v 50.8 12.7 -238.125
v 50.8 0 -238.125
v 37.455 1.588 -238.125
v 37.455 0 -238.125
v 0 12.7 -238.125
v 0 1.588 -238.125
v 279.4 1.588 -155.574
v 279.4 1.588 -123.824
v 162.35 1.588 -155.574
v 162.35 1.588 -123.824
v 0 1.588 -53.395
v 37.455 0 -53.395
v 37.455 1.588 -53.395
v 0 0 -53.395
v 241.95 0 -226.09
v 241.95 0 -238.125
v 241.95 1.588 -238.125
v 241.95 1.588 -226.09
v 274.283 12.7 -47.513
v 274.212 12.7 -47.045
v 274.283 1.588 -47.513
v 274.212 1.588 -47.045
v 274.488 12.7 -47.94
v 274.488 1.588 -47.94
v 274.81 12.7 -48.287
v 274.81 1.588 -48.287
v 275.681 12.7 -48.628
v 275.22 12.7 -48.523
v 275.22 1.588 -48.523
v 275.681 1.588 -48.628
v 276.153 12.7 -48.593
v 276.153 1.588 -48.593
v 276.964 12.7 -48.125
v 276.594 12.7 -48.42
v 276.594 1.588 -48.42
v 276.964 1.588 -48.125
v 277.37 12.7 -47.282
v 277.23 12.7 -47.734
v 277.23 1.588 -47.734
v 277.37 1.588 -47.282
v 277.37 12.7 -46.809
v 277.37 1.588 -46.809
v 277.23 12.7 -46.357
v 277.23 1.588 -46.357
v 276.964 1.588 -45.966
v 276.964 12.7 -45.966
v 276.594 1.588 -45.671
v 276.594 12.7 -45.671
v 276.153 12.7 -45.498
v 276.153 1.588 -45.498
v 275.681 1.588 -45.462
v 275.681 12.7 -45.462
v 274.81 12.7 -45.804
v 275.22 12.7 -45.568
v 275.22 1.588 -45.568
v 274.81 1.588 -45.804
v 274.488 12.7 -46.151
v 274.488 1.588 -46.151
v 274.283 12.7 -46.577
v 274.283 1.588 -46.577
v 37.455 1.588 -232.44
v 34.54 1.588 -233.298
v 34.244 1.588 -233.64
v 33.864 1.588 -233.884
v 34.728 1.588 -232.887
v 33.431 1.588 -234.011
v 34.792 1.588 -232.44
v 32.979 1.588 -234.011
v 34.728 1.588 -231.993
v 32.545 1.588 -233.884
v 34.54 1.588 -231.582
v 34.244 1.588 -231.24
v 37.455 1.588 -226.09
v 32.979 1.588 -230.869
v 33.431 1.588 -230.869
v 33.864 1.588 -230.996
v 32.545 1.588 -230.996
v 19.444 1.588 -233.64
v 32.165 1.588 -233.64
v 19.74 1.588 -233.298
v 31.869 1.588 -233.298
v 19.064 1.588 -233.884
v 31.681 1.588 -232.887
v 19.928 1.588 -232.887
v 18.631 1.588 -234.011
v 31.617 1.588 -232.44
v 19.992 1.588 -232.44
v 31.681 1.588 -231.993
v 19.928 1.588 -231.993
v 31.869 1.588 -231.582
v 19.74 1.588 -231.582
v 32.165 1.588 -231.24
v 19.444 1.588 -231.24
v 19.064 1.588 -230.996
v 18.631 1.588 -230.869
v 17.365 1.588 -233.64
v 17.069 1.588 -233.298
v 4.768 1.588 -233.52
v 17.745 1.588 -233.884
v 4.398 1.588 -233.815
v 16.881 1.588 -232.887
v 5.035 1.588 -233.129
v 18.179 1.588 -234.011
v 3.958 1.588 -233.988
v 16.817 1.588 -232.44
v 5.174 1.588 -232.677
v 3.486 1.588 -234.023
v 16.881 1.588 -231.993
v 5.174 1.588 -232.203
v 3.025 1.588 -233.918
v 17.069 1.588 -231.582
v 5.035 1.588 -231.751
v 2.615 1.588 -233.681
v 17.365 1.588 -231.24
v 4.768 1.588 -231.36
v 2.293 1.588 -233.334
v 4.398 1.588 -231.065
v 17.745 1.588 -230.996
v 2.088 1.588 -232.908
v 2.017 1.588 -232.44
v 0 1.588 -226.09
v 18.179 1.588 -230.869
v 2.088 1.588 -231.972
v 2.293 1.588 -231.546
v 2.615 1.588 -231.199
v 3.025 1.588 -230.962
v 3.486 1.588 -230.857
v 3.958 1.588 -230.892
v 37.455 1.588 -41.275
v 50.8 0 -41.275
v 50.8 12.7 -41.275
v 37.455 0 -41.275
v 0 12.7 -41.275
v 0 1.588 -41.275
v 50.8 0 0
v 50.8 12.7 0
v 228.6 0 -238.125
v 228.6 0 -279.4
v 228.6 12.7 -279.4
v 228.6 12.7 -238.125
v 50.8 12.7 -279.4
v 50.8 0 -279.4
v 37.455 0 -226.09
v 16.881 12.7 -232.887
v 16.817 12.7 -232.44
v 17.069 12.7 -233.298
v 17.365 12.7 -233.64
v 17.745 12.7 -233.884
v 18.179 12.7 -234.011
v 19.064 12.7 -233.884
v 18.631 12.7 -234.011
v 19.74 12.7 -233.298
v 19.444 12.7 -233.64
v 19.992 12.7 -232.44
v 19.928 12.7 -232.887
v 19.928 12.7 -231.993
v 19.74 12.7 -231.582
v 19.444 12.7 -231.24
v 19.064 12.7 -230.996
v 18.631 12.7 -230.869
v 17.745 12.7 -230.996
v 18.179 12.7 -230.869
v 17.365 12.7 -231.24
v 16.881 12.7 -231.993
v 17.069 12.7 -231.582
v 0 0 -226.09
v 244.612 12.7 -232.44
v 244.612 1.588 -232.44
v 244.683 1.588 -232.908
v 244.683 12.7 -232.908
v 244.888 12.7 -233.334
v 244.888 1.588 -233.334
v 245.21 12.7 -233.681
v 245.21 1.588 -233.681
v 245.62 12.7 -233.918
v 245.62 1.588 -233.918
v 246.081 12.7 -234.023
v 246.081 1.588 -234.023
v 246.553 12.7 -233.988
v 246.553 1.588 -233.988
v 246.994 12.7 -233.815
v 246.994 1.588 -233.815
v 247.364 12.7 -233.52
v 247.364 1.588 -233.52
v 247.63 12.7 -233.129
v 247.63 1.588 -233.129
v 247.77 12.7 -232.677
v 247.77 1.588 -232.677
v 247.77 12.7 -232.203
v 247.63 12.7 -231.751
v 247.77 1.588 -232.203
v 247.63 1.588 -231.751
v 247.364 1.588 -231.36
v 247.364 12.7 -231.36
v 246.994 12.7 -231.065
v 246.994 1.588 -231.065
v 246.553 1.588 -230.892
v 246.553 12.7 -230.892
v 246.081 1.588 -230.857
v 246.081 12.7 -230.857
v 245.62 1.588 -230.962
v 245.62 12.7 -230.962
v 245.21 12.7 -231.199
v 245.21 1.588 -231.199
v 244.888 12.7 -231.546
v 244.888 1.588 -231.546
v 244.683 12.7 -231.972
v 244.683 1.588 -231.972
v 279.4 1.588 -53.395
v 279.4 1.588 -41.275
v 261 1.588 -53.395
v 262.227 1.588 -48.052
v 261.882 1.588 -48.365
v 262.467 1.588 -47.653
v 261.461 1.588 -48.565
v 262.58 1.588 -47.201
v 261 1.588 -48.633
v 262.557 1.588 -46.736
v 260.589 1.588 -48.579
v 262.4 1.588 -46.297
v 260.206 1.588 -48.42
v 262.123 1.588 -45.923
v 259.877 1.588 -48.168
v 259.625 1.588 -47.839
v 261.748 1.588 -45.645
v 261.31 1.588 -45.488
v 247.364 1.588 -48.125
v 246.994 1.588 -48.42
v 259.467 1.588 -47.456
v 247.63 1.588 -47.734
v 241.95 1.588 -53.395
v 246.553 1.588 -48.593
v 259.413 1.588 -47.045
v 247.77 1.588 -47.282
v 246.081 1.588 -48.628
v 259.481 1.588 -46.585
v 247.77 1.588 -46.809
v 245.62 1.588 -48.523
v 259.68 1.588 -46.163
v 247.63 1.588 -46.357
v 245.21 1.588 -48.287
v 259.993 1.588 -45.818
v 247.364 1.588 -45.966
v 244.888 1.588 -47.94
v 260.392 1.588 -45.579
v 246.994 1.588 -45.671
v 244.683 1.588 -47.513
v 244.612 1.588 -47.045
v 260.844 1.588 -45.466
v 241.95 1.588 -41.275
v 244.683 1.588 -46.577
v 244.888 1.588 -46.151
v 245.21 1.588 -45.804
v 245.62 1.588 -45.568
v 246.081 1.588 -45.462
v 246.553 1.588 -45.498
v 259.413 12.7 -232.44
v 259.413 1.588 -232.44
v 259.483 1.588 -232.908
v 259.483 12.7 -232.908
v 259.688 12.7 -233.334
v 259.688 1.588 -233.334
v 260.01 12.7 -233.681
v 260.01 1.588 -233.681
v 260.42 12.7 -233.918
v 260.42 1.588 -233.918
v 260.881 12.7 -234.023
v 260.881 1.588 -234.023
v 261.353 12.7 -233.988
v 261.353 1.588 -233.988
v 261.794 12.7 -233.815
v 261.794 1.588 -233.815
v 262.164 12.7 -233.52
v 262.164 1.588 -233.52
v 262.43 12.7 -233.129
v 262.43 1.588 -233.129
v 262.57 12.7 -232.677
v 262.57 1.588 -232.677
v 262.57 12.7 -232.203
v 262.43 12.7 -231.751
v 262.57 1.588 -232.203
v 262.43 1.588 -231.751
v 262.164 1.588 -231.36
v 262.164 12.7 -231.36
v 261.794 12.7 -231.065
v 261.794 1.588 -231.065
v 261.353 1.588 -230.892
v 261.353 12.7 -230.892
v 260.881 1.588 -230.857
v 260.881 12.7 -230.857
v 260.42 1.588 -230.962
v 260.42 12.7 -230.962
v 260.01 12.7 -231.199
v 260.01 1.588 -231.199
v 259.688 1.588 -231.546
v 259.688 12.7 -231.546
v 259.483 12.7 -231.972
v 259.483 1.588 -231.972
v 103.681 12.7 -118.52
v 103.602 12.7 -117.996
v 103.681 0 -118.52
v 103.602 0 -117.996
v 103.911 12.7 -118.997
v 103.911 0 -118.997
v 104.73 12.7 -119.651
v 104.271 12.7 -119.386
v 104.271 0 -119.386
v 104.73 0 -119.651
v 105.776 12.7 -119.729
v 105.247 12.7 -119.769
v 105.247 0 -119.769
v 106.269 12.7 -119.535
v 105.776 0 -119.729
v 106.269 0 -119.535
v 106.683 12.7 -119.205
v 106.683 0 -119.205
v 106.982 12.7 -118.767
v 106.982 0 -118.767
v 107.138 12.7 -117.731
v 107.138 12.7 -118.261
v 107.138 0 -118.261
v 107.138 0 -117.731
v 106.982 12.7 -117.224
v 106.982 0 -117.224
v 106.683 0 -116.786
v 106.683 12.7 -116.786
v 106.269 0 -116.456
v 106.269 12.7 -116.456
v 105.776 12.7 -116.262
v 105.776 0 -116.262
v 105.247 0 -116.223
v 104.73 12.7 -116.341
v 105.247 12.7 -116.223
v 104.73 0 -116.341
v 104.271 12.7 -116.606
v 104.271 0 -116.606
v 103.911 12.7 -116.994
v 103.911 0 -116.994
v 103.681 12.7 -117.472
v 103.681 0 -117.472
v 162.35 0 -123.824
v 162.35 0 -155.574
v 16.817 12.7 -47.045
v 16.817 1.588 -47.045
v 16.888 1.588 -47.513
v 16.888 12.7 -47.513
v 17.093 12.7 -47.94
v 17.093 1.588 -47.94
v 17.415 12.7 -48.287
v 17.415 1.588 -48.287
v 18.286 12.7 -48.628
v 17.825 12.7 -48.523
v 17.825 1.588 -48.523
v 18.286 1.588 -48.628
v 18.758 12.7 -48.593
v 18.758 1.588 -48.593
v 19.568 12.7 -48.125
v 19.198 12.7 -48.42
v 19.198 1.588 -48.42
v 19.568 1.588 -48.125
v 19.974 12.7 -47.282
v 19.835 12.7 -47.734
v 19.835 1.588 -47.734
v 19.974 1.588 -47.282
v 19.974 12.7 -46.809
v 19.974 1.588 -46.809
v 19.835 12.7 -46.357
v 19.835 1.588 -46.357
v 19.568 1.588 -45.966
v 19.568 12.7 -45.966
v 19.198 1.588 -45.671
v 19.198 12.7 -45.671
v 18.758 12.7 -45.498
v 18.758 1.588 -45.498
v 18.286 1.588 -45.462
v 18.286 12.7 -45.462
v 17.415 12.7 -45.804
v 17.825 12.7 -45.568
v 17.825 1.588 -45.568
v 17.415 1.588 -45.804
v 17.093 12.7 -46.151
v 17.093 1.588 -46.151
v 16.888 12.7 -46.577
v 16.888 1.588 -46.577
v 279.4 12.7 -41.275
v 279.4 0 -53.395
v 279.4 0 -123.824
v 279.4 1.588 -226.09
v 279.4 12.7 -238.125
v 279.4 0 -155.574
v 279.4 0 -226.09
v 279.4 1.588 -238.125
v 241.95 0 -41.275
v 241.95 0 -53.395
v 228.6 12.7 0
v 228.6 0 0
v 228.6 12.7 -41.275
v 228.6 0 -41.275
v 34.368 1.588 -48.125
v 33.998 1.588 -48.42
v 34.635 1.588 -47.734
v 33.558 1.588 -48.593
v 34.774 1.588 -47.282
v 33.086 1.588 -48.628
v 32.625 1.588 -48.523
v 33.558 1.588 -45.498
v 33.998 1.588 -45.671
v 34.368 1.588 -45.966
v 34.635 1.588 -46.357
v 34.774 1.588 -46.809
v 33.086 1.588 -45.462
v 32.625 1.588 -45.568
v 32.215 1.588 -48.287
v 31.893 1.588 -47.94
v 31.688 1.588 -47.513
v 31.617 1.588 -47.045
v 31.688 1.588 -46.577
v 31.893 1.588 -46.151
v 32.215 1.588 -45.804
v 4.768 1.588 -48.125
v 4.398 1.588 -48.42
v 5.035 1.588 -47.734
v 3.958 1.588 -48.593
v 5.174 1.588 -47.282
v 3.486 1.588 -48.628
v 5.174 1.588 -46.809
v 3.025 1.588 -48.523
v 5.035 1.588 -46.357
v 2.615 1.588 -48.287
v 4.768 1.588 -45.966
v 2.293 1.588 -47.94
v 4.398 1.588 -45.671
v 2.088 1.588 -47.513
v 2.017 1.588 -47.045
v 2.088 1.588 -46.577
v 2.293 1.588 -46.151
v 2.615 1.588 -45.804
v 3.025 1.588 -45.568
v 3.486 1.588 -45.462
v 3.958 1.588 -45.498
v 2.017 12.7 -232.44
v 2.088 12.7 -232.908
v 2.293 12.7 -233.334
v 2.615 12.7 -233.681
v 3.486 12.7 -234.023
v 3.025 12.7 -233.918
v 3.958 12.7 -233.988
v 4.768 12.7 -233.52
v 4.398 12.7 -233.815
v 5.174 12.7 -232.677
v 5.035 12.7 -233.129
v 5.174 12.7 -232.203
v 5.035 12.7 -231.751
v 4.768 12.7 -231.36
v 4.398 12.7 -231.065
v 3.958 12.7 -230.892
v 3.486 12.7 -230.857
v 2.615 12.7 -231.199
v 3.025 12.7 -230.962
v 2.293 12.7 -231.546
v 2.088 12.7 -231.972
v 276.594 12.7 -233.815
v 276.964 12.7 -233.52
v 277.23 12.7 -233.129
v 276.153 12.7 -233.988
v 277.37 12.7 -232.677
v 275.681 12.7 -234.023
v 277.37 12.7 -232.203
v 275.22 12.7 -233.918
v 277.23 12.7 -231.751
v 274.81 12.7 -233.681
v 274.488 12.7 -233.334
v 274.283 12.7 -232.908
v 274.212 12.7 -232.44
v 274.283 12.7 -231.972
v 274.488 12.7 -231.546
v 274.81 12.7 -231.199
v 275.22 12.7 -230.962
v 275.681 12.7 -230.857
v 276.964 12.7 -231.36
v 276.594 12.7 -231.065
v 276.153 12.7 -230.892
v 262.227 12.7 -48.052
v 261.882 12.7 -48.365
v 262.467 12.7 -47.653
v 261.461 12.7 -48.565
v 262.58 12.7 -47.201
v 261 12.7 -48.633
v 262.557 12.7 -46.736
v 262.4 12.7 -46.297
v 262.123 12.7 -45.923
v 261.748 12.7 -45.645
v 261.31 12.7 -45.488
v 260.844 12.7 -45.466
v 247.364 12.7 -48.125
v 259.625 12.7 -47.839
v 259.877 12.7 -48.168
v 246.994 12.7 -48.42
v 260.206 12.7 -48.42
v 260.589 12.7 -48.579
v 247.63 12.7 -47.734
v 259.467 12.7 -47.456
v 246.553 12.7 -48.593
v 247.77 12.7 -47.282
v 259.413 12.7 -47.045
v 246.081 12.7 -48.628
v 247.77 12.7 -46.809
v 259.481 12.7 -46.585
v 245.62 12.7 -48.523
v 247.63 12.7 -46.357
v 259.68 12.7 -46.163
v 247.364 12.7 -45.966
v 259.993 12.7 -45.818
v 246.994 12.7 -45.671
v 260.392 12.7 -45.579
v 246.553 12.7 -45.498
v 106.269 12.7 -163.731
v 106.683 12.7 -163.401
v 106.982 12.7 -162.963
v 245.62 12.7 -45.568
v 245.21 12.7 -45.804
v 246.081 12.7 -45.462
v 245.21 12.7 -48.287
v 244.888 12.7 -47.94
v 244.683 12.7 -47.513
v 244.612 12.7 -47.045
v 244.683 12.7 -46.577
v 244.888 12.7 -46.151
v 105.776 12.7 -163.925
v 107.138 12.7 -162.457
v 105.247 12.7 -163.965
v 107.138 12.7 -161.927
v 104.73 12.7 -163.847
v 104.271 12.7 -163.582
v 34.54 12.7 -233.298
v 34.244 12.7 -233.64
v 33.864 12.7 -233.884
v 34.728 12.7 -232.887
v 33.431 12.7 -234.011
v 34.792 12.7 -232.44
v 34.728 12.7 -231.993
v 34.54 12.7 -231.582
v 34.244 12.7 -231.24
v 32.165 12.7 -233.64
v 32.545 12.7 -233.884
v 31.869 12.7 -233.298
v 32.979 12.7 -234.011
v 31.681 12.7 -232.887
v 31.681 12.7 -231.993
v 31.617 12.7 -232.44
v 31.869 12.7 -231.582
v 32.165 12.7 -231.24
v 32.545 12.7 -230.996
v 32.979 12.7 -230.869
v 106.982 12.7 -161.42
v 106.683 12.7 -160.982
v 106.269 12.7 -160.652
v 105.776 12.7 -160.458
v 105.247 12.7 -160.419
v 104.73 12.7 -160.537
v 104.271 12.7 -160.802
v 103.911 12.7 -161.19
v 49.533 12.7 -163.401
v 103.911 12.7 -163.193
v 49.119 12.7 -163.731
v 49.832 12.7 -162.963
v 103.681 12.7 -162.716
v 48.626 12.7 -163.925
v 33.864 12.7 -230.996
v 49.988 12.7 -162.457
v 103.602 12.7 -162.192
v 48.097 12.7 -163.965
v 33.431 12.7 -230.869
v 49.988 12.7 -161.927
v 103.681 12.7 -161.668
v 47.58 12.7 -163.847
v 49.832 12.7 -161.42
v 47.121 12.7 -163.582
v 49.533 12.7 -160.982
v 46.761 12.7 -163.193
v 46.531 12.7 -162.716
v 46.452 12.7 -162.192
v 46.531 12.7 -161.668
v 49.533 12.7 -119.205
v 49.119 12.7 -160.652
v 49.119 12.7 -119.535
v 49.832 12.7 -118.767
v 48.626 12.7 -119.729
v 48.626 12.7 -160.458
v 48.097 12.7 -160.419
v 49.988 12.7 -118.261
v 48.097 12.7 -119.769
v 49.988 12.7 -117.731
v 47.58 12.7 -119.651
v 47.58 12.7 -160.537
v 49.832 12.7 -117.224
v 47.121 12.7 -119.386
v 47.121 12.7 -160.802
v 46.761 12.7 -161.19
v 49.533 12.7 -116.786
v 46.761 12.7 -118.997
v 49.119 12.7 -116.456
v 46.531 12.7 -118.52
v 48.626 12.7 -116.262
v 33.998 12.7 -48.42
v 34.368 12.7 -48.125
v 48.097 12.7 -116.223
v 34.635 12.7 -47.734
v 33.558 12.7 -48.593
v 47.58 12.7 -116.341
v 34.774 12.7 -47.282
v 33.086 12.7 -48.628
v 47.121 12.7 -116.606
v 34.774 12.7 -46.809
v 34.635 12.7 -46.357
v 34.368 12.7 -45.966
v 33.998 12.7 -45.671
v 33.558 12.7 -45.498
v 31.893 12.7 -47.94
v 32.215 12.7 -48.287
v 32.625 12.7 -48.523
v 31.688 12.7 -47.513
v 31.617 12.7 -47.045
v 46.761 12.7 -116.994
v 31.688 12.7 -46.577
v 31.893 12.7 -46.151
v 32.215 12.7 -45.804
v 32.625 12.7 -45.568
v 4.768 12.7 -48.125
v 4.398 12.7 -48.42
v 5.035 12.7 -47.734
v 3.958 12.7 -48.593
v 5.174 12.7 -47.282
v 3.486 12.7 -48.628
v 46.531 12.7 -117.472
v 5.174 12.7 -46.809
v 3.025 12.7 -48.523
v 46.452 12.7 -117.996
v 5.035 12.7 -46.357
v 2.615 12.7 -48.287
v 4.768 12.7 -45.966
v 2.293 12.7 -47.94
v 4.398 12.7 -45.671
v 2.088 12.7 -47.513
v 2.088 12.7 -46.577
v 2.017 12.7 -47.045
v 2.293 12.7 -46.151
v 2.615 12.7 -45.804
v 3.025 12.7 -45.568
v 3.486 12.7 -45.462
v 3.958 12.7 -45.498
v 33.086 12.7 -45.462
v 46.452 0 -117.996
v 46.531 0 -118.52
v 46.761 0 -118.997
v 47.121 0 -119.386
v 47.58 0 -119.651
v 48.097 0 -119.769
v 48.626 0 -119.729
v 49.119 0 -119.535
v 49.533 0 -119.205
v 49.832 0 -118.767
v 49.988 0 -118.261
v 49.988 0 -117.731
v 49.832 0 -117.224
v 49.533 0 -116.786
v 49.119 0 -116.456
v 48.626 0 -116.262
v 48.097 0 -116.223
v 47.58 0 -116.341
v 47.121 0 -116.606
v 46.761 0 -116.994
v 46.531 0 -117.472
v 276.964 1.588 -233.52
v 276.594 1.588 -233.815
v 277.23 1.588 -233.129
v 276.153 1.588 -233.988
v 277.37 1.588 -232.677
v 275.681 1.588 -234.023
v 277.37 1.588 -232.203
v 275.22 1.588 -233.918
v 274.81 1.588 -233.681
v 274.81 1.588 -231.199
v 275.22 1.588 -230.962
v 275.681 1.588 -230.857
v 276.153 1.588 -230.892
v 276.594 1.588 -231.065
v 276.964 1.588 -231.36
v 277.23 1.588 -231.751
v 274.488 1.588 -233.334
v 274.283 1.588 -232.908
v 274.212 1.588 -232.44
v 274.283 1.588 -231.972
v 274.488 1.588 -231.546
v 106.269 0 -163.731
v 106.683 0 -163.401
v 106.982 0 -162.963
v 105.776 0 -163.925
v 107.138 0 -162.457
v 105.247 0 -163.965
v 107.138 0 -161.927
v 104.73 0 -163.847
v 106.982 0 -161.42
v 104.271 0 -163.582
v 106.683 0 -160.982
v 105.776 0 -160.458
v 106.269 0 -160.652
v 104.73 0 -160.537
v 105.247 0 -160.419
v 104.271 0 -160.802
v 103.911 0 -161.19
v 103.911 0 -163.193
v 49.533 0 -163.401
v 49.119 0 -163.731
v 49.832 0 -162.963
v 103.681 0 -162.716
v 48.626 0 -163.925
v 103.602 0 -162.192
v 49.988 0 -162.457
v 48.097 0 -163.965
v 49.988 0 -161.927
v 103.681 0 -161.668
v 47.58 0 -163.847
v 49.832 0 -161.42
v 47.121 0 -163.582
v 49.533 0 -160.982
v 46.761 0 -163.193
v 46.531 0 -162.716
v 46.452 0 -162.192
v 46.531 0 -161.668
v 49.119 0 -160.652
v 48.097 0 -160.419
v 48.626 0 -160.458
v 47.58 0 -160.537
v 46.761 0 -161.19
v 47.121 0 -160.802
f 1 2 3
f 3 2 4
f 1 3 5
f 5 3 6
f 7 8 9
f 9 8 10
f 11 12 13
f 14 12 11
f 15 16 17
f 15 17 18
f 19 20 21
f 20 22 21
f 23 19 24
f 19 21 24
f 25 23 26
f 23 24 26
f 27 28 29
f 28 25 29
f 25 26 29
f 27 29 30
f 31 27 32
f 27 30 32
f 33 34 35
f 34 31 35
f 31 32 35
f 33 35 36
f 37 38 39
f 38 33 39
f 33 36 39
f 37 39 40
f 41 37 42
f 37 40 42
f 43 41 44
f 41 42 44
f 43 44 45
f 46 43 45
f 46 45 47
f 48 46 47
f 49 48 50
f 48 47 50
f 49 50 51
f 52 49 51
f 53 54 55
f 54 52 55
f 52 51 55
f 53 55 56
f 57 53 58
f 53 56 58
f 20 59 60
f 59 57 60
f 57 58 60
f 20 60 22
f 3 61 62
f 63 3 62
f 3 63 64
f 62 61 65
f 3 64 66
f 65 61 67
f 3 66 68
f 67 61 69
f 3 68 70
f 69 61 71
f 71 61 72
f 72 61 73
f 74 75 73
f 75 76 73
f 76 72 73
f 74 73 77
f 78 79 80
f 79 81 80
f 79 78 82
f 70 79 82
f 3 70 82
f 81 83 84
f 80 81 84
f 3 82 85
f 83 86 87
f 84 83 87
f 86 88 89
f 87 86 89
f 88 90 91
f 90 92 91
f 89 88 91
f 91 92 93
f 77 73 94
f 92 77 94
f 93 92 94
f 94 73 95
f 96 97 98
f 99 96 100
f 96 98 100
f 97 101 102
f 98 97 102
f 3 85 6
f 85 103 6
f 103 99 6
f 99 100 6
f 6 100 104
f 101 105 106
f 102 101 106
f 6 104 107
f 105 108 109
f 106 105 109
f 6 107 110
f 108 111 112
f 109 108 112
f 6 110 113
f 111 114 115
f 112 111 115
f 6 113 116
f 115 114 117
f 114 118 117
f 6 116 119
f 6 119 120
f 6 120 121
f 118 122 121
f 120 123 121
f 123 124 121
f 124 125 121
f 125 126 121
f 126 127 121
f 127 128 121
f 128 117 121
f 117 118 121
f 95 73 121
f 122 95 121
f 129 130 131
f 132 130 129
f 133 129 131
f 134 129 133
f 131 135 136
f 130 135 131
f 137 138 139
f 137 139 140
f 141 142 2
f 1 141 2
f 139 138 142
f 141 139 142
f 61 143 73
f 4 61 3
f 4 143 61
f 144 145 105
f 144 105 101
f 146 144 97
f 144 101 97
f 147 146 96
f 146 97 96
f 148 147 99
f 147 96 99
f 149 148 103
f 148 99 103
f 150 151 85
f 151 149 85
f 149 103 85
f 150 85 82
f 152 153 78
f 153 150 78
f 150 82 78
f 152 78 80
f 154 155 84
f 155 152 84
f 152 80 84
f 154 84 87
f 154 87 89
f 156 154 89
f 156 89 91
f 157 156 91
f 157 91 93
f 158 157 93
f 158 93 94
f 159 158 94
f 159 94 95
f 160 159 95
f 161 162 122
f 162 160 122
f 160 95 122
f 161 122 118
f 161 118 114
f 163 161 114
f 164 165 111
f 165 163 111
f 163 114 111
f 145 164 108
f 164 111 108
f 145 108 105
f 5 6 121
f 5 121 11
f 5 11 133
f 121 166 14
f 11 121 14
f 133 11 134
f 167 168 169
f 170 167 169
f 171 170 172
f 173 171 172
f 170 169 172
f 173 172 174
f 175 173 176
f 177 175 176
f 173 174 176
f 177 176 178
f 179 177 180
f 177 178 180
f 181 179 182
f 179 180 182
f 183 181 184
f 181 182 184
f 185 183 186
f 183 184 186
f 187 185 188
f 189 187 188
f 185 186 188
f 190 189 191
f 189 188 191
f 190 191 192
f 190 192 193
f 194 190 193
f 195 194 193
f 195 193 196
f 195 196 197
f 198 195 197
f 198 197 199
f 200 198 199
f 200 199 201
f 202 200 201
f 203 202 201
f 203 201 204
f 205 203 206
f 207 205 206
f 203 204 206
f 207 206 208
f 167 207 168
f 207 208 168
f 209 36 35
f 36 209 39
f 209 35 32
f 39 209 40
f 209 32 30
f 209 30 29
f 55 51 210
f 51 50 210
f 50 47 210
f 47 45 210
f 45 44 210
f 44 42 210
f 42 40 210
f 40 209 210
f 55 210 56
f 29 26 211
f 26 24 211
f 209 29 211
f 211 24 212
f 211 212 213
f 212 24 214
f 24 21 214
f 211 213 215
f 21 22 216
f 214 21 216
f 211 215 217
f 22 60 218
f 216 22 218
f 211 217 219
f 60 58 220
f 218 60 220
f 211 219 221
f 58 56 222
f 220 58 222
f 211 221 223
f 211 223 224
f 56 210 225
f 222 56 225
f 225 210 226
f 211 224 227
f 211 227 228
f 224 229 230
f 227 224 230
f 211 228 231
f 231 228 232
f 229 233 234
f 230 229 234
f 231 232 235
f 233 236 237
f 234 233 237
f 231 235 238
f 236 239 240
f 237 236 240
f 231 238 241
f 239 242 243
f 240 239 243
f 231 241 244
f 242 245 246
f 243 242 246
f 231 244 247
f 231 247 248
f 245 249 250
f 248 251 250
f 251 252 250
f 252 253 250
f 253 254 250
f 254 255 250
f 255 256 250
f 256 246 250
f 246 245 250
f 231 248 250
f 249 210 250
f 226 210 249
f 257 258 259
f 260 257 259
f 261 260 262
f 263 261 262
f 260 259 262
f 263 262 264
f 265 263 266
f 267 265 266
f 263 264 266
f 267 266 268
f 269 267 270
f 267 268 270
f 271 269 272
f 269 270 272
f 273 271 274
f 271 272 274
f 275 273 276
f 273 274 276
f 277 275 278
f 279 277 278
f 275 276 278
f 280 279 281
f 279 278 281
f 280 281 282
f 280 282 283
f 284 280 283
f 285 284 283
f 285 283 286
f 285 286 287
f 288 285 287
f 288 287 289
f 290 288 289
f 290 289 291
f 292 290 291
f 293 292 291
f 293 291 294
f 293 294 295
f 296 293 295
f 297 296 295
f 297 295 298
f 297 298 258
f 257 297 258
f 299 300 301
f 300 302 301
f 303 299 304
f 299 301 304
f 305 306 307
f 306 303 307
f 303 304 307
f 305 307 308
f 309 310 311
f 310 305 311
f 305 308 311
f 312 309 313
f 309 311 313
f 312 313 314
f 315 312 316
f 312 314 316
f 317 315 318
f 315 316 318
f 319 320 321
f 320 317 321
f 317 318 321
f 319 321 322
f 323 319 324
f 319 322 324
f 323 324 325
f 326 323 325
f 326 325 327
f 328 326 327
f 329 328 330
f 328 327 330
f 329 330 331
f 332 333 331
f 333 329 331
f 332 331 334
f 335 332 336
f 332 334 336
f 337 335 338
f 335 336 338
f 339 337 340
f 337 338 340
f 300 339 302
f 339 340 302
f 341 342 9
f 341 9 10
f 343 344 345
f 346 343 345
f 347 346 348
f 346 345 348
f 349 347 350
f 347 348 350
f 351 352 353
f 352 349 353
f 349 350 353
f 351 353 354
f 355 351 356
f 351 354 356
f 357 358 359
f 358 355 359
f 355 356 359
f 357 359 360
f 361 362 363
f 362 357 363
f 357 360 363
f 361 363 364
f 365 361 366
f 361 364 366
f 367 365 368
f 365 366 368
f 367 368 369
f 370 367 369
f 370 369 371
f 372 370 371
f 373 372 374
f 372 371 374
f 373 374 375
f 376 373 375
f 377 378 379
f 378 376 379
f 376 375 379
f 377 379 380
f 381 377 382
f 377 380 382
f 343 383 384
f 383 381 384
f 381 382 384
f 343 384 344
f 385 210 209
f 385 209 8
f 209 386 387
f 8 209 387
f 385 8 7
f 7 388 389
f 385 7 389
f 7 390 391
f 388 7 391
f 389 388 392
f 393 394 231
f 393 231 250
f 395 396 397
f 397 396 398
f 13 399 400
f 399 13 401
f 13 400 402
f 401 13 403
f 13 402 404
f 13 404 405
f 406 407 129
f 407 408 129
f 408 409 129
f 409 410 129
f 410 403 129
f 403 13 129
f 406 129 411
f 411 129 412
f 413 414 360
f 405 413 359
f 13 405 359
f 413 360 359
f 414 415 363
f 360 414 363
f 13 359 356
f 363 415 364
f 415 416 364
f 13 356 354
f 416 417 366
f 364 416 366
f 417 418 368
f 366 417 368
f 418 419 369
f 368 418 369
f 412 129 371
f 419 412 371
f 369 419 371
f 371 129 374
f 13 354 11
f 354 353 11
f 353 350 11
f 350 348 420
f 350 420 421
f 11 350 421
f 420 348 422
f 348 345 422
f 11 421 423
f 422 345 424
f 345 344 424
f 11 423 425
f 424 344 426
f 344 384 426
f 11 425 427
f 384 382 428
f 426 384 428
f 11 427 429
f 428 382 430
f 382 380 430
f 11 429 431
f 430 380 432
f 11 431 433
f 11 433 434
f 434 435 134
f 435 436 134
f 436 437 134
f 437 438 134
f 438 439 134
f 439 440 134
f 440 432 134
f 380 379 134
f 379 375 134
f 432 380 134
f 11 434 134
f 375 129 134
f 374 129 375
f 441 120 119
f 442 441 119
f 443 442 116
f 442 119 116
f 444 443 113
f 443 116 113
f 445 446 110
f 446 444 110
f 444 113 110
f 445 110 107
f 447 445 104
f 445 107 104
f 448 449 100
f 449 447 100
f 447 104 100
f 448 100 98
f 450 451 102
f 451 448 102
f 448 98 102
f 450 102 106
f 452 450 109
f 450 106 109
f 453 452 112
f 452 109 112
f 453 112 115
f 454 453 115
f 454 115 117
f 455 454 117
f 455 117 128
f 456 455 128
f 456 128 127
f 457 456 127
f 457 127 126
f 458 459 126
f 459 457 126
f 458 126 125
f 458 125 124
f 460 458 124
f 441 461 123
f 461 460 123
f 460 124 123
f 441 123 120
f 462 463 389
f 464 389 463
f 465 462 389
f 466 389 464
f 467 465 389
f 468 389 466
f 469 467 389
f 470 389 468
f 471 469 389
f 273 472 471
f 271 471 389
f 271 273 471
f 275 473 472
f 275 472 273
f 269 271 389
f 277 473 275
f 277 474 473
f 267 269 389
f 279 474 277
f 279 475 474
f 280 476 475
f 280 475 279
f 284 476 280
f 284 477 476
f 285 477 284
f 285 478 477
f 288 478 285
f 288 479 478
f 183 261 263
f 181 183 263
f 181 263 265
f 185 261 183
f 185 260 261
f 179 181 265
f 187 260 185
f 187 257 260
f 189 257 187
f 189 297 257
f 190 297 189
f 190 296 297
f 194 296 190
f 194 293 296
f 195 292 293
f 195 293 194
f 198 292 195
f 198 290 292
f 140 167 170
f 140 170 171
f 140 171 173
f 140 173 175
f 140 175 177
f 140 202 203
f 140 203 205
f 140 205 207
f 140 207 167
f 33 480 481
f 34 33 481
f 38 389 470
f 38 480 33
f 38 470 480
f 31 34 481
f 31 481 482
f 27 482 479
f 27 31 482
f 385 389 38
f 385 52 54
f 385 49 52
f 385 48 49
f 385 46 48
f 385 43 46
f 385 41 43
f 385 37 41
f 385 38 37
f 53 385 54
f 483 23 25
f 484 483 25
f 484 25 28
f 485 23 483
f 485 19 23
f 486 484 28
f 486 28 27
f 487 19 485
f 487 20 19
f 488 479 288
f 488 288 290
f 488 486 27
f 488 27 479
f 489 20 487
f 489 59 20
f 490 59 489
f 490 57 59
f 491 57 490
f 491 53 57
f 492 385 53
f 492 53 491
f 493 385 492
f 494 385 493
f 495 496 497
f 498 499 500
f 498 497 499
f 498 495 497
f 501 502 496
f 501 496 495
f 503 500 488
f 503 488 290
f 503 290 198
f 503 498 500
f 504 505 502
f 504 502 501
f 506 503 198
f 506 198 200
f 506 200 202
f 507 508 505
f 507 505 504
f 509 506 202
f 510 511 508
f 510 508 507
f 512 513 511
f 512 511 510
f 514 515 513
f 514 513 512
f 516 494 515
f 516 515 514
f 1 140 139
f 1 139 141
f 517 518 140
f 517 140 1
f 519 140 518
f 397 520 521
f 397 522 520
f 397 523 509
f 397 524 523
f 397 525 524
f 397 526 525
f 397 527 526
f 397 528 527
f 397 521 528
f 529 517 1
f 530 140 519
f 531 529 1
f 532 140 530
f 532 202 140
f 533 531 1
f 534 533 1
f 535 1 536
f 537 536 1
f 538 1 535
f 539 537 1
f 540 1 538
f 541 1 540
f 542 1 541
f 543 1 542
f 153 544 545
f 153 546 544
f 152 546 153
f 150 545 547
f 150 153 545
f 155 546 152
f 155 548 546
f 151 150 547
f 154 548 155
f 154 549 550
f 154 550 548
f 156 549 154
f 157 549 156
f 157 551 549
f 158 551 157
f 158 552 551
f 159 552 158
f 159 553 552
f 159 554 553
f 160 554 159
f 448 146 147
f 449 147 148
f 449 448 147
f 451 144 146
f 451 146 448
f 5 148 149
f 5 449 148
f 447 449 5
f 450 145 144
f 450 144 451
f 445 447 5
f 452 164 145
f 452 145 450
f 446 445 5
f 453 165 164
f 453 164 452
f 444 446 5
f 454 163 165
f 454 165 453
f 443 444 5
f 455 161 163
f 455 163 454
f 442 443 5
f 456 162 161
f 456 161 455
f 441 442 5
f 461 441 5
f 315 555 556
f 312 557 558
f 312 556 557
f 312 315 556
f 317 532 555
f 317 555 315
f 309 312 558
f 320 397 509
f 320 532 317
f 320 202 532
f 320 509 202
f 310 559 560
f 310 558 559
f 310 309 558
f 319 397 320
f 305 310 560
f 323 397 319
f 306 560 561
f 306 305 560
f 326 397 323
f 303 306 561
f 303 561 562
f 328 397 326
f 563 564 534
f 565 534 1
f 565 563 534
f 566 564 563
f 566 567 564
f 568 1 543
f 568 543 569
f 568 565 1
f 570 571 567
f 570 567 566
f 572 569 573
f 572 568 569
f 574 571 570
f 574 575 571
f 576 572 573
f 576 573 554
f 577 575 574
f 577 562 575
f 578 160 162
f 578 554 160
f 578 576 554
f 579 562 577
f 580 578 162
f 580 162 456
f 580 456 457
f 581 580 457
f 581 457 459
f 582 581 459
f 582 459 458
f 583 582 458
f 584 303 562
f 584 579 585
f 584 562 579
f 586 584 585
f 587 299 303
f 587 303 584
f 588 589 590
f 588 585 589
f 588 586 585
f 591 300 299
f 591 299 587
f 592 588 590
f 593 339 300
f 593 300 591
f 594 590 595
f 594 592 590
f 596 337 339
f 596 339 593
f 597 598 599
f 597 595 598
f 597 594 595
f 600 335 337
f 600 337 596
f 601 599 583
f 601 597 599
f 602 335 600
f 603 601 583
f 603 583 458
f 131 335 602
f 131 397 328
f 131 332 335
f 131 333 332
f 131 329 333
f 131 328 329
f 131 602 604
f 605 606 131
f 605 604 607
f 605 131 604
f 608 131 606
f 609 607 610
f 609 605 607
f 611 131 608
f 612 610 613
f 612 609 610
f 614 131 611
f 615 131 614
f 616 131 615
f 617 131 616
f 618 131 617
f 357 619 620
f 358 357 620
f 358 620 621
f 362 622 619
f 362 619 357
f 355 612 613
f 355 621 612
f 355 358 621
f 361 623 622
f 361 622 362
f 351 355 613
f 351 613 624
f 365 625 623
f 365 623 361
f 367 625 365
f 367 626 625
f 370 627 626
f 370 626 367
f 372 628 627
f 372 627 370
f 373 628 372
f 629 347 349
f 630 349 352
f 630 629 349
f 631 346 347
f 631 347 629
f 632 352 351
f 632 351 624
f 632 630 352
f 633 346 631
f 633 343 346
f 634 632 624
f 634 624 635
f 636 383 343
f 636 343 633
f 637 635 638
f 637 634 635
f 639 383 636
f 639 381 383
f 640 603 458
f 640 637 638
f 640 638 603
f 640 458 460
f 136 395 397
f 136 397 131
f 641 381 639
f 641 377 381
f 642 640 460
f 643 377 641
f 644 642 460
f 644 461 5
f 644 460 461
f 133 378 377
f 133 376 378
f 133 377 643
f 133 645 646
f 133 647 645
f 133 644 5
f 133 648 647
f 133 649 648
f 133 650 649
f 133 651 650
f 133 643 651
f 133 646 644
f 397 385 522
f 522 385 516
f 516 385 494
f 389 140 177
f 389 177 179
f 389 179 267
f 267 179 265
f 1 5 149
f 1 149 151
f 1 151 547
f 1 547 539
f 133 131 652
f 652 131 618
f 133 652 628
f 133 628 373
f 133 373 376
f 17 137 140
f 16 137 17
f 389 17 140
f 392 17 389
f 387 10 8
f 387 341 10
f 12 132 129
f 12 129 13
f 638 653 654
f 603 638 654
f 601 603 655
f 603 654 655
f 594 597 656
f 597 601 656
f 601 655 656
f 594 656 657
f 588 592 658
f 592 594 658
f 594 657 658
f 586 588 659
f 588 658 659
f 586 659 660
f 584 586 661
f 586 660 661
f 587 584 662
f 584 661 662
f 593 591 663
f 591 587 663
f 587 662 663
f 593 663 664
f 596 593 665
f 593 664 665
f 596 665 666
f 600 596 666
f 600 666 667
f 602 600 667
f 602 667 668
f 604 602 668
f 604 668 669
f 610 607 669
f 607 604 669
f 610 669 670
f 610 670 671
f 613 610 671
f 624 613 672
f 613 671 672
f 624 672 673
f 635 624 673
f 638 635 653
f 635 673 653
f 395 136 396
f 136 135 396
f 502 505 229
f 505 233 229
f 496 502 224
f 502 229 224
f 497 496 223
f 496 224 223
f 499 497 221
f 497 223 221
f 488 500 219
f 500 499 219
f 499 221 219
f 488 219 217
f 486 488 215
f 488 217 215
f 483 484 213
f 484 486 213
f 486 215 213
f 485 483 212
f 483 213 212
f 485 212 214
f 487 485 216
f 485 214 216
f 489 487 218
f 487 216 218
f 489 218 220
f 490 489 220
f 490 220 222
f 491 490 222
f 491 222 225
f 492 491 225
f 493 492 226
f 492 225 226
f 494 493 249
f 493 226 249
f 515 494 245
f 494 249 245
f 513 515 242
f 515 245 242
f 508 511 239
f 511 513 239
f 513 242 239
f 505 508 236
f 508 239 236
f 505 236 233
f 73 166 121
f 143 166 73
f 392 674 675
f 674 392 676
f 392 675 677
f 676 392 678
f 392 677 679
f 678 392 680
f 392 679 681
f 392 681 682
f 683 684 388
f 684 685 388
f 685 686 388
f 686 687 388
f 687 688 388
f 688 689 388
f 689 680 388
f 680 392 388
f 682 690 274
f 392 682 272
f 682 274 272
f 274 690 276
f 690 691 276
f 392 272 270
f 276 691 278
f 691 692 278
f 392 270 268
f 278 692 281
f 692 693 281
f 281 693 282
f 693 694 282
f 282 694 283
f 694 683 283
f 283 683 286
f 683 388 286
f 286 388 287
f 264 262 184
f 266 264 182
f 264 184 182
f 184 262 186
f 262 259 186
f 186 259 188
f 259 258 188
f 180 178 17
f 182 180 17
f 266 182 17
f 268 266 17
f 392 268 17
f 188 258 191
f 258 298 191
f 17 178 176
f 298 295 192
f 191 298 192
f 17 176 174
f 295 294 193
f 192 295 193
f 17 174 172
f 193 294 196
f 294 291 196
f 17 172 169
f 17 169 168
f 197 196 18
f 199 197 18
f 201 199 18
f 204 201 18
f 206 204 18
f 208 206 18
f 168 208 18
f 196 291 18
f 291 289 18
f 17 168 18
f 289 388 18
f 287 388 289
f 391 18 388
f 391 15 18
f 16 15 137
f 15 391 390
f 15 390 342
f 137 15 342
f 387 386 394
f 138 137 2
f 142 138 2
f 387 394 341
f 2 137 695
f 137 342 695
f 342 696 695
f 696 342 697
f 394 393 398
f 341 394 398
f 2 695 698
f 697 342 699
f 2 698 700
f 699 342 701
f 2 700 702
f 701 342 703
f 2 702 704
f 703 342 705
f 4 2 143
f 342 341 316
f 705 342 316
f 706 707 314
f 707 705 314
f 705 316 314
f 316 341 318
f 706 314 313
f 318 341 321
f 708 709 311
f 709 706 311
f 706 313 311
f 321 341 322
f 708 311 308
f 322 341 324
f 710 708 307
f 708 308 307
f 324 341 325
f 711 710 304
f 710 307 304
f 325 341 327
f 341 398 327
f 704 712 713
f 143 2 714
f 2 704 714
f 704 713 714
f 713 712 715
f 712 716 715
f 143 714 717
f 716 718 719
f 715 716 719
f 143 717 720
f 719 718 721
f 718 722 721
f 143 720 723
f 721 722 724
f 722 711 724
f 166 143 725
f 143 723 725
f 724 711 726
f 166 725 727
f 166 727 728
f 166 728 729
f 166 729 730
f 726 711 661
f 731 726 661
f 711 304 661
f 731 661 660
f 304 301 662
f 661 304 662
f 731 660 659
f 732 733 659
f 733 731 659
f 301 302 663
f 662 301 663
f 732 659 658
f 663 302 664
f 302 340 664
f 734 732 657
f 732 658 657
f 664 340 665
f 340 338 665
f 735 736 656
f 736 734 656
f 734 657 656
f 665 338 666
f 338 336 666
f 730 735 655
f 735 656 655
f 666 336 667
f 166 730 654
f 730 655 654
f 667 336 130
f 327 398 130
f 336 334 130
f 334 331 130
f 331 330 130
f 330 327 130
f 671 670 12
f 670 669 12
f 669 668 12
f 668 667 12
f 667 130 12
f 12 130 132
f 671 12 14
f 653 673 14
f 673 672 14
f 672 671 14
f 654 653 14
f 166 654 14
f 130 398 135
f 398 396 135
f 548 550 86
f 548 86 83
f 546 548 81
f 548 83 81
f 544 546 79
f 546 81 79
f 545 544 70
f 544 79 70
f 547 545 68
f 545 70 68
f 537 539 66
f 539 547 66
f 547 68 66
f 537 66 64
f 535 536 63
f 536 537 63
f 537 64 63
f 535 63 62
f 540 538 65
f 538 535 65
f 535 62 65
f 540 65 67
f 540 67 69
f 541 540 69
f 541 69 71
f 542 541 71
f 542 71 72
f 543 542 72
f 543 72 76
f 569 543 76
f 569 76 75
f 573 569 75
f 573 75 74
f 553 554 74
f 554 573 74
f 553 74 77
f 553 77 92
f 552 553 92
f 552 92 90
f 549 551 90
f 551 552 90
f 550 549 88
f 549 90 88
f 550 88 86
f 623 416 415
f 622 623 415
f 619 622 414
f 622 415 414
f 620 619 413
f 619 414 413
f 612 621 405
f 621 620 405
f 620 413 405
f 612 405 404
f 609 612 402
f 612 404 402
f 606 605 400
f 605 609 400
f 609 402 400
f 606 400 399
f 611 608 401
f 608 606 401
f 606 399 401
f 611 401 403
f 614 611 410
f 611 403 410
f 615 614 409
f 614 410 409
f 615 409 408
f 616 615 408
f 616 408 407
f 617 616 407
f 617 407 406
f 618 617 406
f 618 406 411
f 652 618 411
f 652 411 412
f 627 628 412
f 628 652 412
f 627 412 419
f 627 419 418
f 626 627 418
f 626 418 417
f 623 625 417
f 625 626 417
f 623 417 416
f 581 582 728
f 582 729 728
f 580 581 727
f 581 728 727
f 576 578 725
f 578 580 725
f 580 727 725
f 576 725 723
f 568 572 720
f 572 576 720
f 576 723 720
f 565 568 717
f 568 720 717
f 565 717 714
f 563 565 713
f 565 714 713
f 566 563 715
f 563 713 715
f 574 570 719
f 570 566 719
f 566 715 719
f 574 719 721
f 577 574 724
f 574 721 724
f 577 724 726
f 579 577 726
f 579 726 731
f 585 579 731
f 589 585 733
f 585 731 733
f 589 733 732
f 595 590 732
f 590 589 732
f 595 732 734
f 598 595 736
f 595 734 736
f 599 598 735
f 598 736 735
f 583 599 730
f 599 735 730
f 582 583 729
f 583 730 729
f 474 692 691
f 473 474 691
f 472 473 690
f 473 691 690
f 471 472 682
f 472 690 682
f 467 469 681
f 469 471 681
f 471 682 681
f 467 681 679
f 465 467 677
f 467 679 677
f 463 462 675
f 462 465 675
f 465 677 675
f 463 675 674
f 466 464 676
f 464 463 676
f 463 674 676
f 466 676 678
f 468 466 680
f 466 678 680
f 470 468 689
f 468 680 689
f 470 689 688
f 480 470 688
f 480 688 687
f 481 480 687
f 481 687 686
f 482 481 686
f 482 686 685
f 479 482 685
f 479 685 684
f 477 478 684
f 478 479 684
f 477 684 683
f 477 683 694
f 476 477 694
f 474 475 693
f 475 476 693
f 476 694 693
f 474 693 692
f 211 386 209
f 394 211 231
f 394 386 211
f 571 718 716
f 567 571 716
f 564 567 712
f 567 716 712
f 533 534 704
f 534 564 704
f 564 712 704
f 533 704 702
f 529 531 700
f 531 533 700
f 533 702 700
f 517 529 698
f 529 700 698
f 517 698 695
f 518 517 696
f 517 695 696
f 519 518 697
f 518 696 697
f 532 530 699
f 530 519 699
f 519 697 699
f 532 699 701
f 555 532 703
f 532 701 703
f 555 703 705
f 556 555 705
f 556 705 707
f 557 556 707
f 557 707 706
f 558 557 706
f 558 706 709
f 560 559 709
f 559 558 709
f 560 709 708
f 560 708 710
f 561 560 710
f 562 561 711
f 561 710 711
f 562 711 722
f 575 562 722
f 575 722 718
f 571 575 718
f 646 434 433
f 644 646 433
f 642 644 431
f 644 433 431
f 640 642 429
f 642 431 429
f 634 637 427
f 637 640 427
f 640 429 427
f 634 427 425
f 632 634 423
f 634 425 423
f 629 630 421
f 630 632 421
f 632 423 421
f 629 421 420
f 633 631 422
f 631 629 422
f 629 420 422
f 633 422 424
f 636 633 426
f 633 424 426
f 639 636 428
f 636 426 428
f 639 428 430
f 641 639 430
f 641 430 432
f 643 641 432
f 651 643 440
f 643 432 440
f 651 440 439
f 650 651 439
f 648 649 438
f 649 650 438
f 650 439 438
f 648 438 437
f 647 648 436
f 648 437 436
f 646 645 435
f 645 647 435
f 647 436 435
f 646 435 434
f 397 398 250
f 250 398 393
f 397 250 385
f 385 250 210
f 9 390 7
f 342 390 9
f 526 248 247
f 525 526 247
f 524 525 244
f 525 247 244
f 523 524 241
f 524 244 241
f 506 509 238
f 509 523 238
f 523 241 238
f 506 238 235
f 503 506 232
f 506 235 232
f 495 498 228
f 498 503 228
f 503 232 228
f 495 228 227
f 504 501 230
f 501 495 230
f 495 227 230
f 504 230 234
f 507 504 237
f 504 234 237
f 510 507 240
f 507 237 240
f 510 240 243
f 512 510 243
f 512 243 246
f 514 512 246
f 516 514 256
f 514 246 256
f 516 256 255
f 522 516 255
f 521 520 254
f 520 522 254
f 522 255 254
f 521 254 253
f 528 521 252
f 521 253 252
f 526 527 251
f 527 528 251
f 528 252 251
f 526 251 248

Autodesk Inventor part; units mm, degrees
ref_plane "YZ Plane" through (0, 0, 0) normal (1, 0, 0) x (0, 1, 0)
ref_plane "XZ Plane" through (0, 0, 0) normal (0, 1, 0) x (-1, 0, 0)
ref_plane "XY Plane" through (0, 0, 0) normal (0, 0, 1) x (1, 0, 0)
sketch "Sketch1" plane through (0, 0, 0) normal (0, 1, 0) x (-1, 0, 0)
  line L0 (-279.4, -127.4986) -> (-279.4, -151.8986)
  line L1 (-277.4, -125.4986) -> (-174.3, -125.4986)
  line L2 (-174.3, -153.8986) -> (-277.4, -153.8986)
  circle A0 centre (-275.8, -47.0543) radius 1.25
  circle A1 centre (-261, -47.0543) radius 1.25
  circle A2 centre (-246.2, -47.0543) radius 1.25
  circle A3 centre (-261, -232.44) radius 1.25
  circle A4 centre (-18.4, -47.0543) radius 1.25
  circle A5 centre (-48.23, -117.9957) radius 1.778
  circle A6 centre (-48.23, -162.1917) radius 1.778
  circle A7 centre (-105.38, -162.1917) radius 1.778
  circle A8 centre (-105.38, -117.9957) radius 1.778
  line L3 (0, 0) -> (-279.4, 0)
  line L4 (-279.4, 0) -> (-279.4, -279.4)
  line L5 (-279.4, -279.4) -> (0, -279.4)
  line L6 (0, -279.4) -> (0, 0)
  line L7 (-279.4, 0) -> (-228.6, 0)
  line L8 (-228.6, 0) -> (-228.6, -41.275)
  line L9 (-228.6, -41.275) -> (-279.4, -41.275)
  line L10 (-279.4, -41.275) -> (-279.4, 0)
  line L11 (-279.4, -279.4) -> (-228.6, -279.4)
  line L12 (-228.6, -279.4) -> (-228.6, -238.125)
  line L13 (-228.6, -238.125) -> (-279.4, -238.125)
  line L14 (-279.4, -238.125) -> (-279.4, -279.4)
  line L15 (0, -279.4) -> (-50.8, -279.4)
  line L16 (-50.8, -279.4) -> (-50.8, -238.125)
  line L17 (-50.8, -238.125) -> (0, -238.125)
  line L18 (0, -238.125) -> (0, -279.4)
  line L19 (0, 0) -> (-50.8, 0)
  line L20 (-50.8, 0) -> (-50.8, -41.275)
  line L21 (-50.8, -41.275) -> (0, -41.275)
  line L22 (0, -41.275) -> (0, 0)
  arc A9 (-174.3, -153.6986) -> (-174.3, -125.6986) centre (-182.3, -139.6986) ccw
  line L23 (-162.35, -123.8236) -> (-289.35, -123.8236)
  line L24 (-289.35, -123.8236) -> (-289.35, -155.5736)
  line L25 (-289.35, -155.5736) -> (-162.35, -155.5736)
  line L26 (-162.35, -155.5736) -> (-162.35, -123.8236)
  line L27 (-162.35, -123.8236) -> (-289.35, -155.5736) construction
  line L28 (-289.35, -123.8236) -> (-162.35, -155.5736) construction
  line L29 (-280.05, -238.79) -> (-241.95, -238.79)
  line L30 (-241.95, -238.79) -> (-241.95, -226.09)
  line L31 (-241.95, -226.09) -> (-280.05, -226.09)
  line L32 (-280.05, -226.09) -> (-280.05, -238.79)
  line L33 (-280.05, -238.79) -> (-241.95, -226.09) construction
  line L34 (-241.95, -238.79) -> (-280.05, -226.09) construction
  circle A10 centre (-261, -232.44) radius 1.5875
  circle A11 centre (-246.2, -232.44) radius 1.5875
  circle A12 centre (-275.8, -232.44) radius 1.5875
  line L35 (-261, -47.0543) -> (-261, -232.44)
  line L36 (-261, -232.44) -> (-18.4, -232.44)
  circle A13 centre (-261, -47.0454) radius 1.5875
  line L37 (-280.05, -53.3954) -> (-241.95, -53.3954)
  line L38 (-241.95, -53.3954) -> (-241.95, -40.6954)
  line L39 (-241.95, -40.6954) -> (-280.05, -40.6954)
  circle A14 centre (-246.2, -47.0454) radius 1.5875
  line L40 (-280.05, -40.6954) -> (-280.05, -53.3954)
  circle A15 centre (-275.8, -47.0454) radius 1.5875
  circle A16 centre (-18.4046, -232.44) radius 1.5875
  line L41 (-37.4546, -238.79) -> (0.6454, -238.79)
  line L42 (0.6454, -238.79) -> (0.6454, -226.09)
  line L43 (0.6454, -226.09) -> (-37.4546, -226.09)
  circle A17 centre (-3.6046, -232.44) radius 1.5875
  line L44 (-37.4546, -226.09) -> (-37.4546, -238.79)
  circle A18 centre (-33.2046, -232.44) radius 1.5875
  circle A19 centre (-18.4046, -47.0454) radius 1.5875
  line L45 (-37.4546, -53.3954) -> (0.6454, -53.3954)
  line L46 (0.6454, -53.3954) -> (0.6454, -40.6954)
  line L47 (0.6454, -40.6954) -> (-37.4546, -40.6954)
  circle A20 centre (-3.6046, -47.0454) radius 1.5875
  line L48 (-37.4546, -40.6954) -> (-37.4546, -53.3954)
  circle A21 centre (-33.2046, -47.0454) radius 1.5875
  point P0 (-225.85, -139.6986)
  dimension "d4" = 279.4
  dimension "d5" = 279.4
  dimension "d6" = 50.8
  dimension "d7" = 41.275
  dimension "d8" = 50.8
  dimension "d9" = 41.275
  dimension "d10" = 50.8
  dimension "d11" = 41.275
  dimension "d12" = 41.275
  dimension "d13" = 127
  dimension "d14" = 31.75
  dimension "d15" = 38.1
  dimension "d16" = 12.7
  dimension "d17" = 3.175
  dimension "d18" = 185.3946
  dimension "d19" = 242.5954
extrude "Extrusion1" add sketch "Sketch1" along normal blind 12.7 contours L4 L23 L35 L25 L0 | L4 L37 L35 L23 | L25 L35 L31 L4 | L4 L9 L38 L37 | L35 L37 L38 L9 L8 L3 L20 L21 L48 L45 L6 L43 L44 L36 L30 L31 L25 L26 L23 | L23 L26 L25 L35 | L31 L35 A10 L36 A11 L30 L13 L4 | L31 L30 L36 A11 A10 L35 | L30 L36 L44 L17 L16 L5 L12 L13 | L44 L43 L6 L17 | L21 L6 L45 L48
sketch "Sketch3" plane through (0, 0, 0) normal (0, 1, 0) x (-1, 0, 0)
  line L0 (-279.4, -127.4986) -> (-279.4, -151.8986)
  line L1 (-277.4, -125.4986) -> (-174.3, -125.4986)
  line L2 (-174.3, -153.8986) -> (-277.4, -153.8986)
  circle A0 centre (-246.2, -47.0543) radius 1.25
  circle A1 centre (-261, -232.44) radius 1.25
  circle A2 centre (-18.4, -47.0543) radius 1.25
  circle A3 centre (-48.23, -117.9957) radius 1.778
  circle A4 centre (-48.23, -162.1917) radius 1.778
  circle A5 centre (-105.38, -162.1917) radius 1.778
  circle A6 centre (-105.38, -117.9957) radius 1.778
  line L3 (0, 0) -> (-279.4, 0)
  line L4 (-279.4, 0) -> (-279.4, -279.4)
  line L5 (-279.4, -279.4) -> (0, -279.4)
  line L6 (0, -279.4) -> (0, 0)
  line L7 (-279.4, 0) -> (-228.6, 0)
  line L8 (-279.4, -41.275) -> (-279.4, 0)
  line L9 (-279.4, -279.4) -> (-228.6, -279.4)
  line L10 (-228.6, -279.4) -> (-228.6, -238.125)
  line L11 (-228.6, -238.125) -> (-279.4, -238.125)
  line L12 (-279.4, -238.125) -> (-279.4, -279.4)
  line L13 (0, -279.4) -> (-50.8, -279.4)
  line L14 (-50.8, -279.4) -> (-50.8, -238.125)
  line L15 (-50.8, -238.125) -> (0, -238.125)
  line L16 (0, -238.125) -> (0, -279.4)
  line L17 (0, 0) -> (-50.8, 0)
  line L18 (-50.8, 0) -> (-50.8, -41.275)
  line L19 (-50.8, -41.275) -> (0, -41.275)
  line L20 (0, -41.275) -> (0, 0)
  arc A7 (-174.3, -153.6986) -> (-174.3, -125.6986) centre (-182.3, -139.6986) ccw
  line L21 (-162.35, -123.8236) -> (-289.35, -123.8236)
  line L22 (-289.35, -123.8236) -> (-289.35, -155.5736)
  line L23 (-289.35, -155.5736) -> (-162.35, -155.5736)
  line L24 (-162.35, -155.5736) -> (-162.35, -123.8236)
  line L25 (-162.35, -123.8236) -> (-289.35, -155.5736) construction
  line L26 (-289.35, -123.8236) -> (-162.35, -155.5736) construction
  line L27 (-280.05, -238.79) -> (-241.95, -238.79)
  line L28 (-241.95, -238.79) -> (-241.95, -226.09)
  line L29 (-241.95, -226.09) -> (-280.05, -226.09)
  line L30 (-280.05, -226.09) -> (-280.05, -238.79)
  line L31 (-280.05, -238.79) -> (-241.95, -226.09) construction
  line L32 (-241.95, -238.79) -> (-280.05, -226.09) construction
  circle A8 centre (-261, -232.44) radius 1.5875
  circle A9 centre (-246.2, -232.44) radius 1.5875
  circle A10 centre (-275.8, -232.44) radius 1.5875
  line L33 (-261, -47.0543) -> (-261, -232.44)
  line L34 (-261, -232.44) -> (-18.4, -232.44)
  circle A11 centre (-261, -47.0454) radius 1.5875
  line L35 (-280.05, -53.3954) -> (-241.95, -53.3954)
  line L36 (-241.95, -53.3954) -> (-241.95, -40.6954)
  line L37 (-241.95, -40.6954) -> (-280.05, -40.6954)
  circle A12 centre (-246.2, -47.0454) radius 1.5875
  line L38 (-280.05, -40.6954) -> (-280.05, -53.3954)
  circle A13 centre (-275.8, -47.0454) radius 1.5875
  circle A14 centre (-18.4046, -232.44) radius 1.5875
  line L39 (-37.4546, -238.79) -> (0.6454, -238.79)
  line L40 (0.6454, -238.79) -> (0.6454, -226.09)
  line L41 (0.6454, -226.09) -> (-37.4546, -226.09)
  circle A15 centre (-3.6046, -232.44) radius 1.5875
  line L42 (-37.4546, -226.09) -> (-37.4546, -238.79)
  circle A16 centre (-33.2046, -232.44) radius 1.5875
  circle A17 centre (-18.4046, -47.0454) radius 1.5875
  line L43 (-37.4546, -53.3954) -> (0.6454, -53.3954)
  line L44 (0.6454, -53.3954) -> (0.6454, -40.6954)
  line L45 (0.6454, -40.6954) -> (-37.4546, -40.6954)
  circle A18 centre (-3.6046, -47.0454) radius 1.5875
  line L46 (-37.4546, -40.6954) -> (-37.4546, -53.3954)
  circle A19 centre (-33.2046, -47.0454) radius 1.5875
  point P0 (-225.85, -139.6986)
  dimension "d26" = 279.4
  dimension "d27" = 279.4
  dimension "d30" = 50.8
  dimension "d31" = 41.275
  dimension "d32" = 50.8
  dimension "d33" = 41.275
  dimension "d34" = 41.275
  dimension "d35" = 127
  dimension "d36" = 31.75
  dimension "d37" = 38.1
  dimension "d38" = 12.7
  dimension "d39" = 3.175
  dimension "d40" = 185.3946
  dimension "d41" = 242.5954
extrude "Extrusion2" cut sketch "Sketch3" along normal blind 1.5875 contours L4 L21 L33 L23 L0 | L0 L4 L23 L22 L21 | L35 L38 L37 L4 | L4 L37 L36 L35 | L21 L24 L23 L33 | L29 L33 A8 L34 A9 L28 L11 L4 | L4 L27 L30 L29 | L11 L28 L27 L4 | L29 L28 L34 A9 A8 L33 | L42 L41 L6 L15 | L15 L6 L39 L42 | L41 L40 L39 L6 | L45 L44 L43 L6 | L6 L19 L46 L45 | L19 L6 L43 L46
properties part number "BottomPlateV1" material "Wood (Birch)"
